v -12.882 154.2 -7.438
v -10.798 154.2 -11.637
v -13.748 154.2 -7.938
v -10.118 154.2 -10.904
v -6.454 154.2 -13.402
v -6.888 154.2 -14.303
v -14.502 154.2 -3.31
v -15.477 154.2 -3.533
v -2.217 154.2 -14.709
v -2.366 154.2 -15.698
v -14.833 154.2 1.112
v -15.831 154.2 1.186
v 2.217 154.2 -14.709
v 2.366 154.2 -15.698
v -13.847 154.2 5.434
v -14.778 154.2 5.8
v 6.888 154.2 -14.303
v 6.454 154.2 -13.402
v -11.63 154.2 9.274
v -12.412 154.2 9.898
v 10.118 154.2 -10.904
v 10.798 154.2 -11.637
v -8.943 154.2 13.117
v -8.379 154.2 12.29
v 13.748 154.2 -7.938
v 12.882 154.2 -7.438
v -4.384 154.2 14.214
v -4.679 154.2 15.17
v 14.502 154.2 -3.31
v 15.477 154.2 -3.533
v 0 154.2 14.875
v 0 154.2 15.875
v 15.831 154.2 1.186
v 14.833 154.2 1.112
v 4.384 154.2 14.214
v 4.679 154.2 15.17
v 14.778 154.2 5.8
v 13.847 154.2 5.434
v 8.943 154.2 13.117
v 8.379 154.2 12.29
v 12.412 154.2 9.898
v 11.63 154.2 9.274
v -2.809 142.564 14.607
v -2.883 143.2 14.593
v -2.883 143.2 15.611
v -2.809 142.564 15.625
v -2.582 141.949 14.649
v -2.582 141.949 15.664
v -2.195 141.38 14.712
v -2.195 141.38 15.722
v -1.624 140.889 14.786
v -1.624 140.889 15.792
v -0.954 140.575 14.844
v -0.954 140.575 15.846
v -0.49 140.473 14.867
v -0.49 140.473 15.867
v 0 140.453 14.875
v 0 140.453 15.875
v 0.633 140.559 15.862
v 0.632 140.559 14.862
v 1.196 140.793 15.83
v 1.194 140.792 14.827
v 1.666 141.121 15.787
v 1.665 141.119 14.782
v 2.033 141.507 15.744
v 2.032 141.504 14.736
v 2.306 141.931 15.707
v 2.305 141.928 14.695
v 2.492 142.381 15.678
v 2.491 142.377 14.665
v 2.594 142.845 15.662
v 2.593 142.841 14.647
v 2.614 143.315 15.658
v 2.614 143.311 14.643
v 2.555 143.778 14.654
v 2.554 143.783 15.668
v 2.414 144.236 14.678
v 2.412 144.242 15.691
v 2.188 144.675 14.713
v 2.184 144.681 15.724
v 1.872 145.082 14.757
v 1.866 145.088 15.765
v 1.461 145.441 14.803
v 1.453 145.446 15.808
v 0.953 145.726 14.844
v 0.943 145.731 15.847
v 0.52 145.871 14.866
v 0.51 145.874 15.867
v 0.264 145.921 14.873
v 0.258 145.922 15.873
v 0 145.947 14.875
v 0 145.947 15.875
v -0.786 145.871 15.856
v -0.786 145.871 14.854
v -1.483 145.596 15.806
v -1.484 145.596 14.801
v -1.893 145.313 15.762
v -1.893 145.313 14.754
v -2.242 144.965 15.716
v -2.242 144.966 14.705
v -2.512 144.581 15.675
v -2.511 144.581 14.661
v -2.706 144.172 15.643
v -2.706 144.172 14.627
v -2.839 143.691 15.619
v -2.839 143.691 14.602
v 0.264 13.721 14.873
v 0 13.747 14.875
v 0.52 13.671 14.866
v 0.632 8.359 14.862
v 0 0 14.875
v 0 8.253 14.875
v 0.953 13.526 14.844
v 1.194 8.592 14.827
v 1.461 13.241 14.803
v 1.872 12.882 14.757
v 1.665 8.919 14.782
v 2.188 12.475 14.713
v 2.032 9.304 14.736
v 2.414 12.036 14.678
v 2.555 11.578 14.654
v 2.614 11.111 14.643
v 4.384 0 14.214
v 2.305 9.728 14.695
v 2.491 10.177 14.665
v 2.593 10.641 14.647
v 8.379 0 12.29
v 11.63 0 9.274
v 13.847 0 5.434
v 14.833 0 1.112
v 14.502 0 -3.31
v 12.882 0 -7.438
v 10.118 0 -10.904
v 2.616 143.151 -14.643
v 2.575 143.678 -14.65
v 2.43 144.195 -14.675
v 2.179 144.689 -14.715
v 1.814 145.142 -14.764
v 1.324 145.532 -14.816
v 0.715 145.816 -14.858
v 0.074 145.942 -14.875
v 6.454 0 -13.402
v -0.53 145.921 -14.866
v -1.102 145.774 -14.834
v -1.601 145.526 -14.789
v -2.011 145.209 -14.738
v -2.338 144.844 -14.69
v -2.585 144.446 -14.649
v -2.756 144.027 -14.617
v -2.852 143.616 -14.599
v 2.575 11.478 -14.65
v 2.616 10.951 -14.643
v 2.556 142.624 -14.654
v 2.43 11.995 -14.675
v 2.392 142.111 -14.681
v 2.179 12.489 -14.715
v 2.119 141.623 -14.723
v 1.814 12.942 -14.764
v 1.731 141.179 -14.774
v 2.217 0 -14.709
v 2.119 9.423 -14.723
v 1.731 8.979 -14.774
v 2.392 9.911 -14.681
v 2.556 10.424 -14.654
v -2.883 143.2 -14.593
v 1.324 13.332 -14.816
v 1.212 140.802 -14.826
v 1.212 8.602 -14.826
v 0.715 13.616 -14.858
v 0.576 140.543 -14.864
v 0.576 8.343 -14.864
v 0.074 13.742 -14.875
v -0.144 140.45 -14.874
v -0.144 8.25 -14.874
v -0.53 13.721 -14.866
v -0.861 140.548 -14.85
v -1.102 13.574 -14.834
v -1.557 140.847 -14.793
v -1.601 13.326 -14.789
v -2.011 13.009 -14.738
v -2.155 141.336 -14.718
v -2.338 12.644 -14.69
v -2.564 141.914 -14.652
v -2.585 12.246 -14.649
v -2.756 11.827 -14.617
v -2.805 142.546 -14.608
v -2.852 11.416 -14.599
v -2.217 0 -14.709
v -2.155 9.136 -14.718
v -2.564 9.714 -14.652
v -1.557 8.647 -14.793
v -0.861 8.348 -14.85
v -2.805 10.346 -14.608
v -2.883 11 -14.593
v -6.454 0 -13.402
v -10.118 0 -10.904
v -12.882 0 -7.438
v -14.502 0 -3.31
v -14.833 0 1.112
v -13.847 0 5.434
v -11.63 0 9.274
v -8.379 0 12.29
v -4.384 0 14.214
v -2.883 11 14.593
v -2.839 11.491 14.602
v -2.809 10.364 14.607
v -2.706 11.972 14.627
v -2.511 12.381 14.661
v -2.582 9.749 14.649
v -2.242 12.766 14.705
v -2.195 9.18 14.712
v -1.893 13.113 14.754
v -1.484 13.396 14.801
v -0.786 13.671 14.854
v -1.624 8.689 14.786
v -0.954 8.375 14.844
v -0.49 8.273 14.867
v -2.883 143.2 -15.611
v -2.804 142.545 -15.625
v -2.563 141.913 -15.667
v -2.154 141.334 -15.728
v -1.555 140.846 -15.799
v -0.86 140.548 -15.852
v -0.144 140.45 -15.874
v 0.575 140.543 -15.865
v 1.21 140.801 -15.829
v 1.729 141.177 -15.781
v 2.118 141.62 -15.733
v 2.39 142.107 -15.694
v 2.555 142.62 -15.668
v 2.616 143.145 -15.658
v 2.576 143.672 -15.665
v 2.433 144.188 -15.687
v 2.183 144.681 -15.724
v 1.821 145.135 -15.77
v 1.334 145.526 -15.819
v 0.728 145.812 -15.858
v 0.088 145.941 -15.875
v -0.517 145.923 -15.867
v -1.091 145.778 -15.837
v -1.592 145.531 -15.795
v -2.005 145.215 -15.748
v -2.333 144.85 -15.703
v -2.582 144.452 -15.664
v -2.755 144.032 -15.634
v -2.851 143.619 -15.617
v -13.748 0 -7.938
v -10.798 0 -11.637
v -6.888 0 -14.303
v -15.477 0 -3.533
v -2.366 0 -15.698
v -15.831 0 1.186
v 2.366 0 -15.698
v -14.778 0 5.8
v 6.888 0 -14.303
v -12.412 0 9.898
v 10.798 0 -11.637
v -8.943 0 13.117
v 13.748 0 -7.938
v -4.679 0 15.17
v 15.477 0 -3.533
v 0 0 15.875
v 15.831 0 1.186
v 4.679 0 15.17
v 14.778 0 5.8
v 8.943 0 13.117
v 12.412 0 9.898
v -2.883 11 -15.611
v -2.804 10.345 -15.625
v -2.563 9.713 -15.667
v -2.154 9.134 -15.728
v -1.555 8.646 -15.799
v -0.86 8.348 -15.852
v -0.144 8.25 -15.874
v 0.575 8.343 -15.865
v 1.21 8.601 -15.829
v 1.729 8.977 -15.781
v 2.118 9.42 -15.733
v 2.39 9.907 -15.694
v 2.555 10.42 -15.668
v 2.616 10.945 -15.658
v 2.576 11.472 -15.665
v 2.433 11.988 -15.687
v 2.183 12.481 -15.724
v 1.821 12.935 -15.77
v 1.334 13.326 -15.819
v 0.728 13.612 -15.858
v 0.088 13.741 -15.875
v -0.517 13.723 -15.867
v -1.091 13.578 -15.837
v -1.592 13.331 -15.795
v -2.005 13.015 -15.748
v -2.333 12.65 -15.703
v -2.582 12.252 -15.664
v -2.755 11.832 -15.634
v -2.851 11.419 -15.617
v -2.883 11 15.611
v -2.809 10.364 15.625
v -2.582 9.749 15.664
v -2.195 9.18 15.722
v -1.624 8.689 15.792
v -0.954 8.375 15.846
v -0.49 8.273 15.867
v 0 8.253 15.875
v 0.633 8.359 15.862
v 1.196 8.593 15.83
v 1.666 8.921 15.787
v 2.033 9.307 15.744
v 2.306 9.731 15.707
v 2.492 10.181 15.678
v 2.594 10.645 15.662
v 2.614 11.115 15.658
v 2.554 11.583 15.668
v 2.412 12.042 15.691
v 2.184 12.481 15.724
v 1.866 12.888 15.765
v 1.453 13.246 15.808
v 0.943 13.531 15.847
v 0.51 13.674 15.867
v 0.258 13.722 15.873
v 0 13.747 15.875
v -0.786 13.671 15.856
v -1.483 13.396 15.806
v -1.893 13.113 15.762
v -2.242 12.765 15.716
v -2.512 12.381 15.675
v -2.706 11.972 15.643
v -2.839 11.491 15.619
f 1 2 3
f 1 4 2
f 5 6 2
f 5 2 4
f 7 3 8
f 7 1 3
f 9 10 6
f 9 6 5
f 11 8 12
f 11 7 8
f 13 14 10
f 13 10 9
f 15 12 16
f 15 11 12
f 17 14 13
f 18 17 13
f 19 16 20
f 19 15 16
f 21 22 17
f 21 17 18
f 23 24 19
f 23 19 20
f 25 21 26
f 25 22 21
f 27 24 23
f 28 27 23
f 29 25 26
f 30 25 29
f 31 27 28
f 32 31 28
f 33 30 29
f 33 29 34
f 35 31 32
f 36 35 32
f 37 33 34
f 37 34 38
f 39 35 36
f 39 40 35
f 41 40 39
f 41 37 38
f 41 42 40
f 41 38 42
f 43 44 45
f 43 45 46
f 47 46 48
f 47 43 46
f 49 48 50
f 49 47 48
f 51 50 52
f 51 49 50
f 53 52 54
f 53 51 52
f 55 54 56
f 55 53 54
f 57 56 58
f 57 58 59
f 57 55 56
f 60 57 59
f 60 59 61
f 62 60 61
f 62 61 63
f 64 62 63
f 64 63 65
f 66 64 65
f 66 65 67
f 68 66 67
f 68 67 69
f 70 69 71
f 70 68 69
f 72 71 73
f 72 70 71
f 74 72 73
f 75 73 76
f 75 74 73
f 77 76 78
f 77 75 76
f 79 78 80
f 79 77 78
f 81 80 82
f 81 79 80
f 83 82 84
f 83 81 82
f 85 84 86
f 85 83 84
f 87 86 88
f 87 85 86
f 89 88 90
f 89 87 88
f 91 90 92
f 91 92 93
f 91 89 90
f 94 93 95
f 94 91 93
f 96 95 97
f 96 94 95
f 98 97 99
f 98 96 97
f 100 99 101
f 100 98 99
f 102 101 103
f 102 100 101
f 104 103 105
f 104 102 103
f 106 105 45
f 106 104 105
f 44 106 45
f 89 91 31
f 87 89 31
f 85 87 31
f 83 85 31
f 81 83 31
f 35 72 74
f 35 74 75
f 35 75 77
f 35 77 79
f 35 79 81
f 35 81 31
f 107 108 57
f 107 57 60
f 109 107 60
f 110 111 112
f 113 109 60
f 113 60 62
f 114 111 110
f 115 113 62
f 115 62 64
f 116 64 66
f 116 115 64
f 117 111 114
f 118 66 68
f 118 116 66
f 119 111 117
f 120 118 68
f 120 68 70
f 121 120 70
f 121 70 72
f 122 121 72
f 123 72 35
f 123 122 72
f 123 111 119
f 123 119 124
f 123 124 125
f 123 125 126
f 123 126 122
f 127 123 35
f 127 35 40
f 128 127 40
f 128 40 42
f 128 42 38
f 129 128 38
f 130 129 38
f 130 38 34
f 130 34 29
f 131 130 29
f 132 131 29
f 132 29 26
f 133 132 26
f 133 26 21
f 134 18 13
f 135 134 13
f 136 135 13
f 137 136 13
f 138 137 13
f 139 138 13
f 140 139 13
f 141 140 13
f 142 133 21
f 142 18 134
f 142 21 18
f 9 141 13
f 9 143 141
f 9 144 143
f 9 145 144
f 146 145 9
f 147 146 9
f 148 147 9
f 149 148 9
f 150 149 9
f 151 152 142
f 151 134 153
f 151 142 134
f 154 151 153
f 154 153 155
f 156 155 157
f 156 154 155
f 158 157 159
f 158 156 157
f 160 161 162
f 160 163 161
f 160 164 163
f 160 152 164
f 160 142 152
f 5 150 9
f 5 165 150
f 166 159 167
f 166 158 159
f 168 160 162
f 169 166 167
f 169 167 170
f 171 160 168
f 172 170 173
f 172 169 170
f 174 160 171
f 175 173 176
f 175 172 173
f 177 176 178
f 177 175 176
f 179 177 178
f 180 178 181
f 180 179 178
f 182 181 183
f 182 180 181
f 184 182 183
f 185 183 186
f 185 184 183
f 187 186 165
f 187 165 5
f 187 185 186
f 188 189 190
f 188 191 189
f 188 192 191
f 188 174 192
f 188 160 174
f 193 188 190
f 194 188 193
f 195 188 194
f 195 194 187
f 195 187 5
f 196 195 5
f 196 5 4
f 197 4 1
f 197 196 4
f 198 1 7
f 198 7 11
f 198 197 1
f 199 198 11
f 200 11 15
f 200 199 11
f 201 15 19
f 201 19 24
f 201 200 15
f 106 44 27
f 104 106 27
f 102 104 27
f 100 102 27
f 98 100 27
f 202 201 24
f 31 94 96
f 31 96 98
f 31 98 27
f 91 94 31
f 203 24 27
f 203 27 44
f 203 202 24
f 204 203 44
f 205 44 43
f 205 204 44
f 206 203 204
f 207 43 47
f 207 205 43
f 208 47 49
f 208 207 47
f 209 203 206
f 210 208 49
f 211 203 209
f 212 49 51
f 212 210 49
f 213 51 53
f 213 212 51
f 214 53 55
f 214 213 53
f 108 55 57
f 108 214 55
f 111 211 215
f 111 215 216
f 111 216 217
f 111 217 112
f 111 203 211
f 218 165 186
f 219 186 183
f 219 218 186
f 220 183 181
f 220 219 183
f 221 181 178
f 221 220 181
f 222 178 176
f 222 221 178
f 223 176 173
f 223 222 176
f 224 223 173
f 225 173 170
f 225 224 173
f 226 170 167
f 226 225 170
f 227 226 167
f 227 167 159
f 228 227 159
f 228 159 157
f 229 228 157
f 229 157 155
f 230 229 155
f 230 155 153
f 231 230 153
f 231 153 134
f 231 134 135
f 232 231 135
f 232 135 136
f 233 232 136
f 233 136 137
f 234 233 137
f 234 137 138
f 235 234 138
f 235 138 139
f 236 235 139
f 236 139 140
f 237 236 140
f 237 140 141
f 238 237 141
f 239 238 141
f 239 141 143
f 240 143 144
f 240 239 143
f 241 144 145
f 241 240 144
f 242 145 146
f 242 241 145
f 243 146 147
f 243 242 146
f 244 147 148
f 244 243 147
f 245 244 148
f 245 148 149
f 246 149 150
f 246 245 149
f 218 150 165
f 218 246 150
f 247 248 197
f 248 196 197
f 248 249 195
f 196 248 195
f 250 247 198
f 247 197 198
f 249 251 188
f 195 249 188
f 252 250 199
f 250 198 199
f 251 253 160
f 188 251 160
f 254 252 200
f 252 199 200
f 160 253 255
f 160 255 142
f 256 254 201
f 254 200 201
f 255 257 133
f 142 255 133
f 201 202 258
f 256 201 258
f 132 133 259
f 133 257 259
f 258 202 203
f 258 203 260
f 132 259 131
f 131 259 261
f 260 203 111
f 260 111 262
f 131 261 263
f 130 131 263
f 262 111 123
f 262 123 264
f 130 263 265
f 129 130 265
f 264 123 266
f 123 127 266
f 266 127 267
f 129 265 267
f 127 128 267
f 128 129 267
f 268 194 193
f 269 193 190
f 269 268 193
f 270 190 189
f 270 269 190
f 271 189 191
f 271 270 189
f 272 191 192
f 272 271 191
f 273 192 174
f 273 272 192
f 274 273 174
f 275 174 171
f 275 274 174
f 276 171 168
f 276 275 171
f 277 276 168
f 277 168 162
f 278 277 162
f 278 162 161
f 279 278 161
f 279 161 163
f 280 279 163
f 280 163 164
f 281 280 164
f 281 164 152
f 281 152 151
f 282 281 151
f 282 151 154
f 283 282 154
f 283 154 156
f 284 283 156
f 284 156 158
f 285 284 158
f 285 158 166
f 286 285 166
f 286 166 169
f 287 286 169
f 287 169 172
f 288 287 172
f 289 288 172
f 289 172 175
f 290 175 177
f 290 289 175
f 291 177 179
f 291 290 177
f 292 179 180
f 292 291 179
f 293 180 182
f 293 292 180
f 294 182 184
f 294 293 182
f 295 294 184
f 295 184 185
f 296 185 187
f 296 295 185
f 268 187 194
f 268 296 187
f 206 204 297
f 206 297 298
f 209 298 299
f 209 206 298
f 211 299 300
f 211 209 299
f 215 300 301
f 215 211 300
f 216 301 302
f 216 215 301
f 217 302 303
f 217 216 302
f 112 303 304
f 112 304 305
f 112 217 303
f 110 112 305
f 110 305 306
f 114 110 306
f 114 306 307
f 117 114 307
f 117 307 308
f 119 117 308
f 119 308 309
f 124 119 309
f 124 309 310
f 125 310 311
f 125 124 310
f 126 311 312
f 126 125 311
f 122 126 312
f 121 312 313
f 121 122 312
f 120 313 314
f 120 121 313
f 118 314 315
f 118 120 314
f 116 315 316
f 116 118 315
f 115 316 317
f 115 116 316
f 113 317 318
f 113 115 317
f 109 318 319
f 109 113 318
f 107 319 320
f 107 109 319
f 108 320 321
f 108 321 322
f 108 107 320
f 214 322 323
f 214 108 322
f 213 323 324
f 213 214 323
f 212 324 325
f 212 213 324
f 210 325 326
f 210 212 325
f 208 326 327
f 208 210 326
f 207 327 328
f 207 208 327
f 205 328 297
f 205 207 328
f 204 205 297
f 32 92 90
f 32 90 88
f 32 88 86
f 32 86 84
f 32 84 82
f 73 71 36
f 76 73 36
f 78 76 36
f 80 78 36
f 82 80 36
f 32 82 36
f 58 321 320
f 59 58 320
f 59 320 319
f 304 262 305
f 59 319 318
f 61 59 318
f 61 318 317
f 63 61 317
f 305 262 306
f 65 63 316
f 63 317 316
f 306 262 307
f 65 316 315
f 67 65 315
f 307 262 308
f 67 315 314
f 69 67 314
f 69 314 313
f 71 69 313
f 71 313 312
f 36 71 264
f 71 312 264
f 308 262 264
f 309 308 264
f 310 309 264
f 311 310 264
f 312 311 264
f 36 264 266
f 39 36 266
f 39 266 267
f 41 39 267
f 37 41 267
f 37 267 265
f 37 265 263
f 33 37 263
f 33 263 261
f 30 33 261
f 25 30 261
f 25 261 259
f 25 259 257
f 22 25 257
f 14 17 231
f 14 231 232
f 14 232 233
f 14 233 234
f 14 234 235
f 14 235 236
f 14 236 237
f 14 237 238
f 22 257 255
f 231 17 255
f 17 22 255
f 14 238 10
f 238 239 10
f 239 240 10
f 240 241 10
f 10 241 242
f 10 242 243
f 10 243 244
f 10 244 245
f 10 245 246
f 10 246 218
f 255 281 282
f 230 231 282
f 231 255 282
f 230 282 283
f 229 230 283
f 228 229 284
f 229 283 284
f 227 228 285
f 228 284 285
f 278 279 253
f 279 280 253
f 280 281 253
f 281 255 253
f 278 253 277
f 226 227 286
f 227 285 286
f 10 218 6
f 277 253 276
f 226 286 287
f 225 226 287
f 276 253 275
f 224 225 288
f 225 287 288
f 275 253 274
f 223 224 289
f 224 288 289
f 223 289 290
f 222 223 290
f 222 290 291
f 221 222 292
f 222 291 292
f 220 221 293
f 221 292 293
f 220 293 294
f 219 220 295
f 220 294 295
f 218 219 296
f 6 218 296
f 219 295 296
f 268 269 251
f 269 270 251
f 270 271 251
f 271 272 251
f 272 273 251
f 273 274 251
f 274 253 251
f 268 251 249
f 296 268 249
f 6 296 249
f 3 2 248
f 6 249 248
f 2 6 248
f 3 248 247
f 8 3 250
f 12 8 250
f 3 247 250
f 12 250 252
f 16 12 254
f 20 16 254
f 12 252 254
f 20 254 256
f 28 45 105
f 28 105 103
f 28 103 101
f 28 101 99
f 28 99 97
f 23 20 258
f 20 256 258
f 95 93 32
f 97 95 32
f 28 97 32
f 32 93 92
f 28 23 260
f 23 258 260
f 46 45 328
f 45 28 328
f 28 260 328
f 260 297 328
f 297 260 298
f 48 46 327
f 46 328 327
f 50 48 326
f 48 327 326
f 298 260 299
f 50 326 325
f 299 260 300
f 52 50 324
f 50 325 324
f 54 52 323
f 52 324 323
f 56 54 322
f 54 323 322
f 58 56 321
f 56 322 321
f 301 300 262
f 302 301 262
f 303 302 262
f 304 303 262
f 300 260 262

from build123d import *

# Parameters (mm, degrees)
SKETCH1_R               = 15.875
SKETCH1_R_2             = 14.875
BOSS_EXTRUDE1_DEPTH     = 154.2
CUT_EXTRUDE1_DEPTH      = 154.2
CUT_EXTRUDE1_DEPTH_BACK = 154.2
SKETCH2_R               = 2.75


with BuildPart() as part:
    # Sketch1 → Boss-Extrude1 (new body)
    with BuildSketch(Plane(origin=(0, 0, 0), x_dir=(1, 0, 0), z_dir=(0, 1, 0))):
        Circle(SKETCH1_R)
        Circle(SKETCH1_R_2, mode=Mode.SUBTRACT)
    extrude(amount=BOSS_EXTRUDE1_DEPTH)

    # Sketch2 → Cut-Extrude1 (cut, two sides: drawn at the far end of the back side and taken through both)
    with BuildSketch(Plane.XY.offset(-CUT_EXTRUDE1_DEPTH_BACK)):
        with Locations((-0.133461596, 143.2)):
            Circle(SKETCH2_R)
        with Locations((-0.133461596, 11)):
            Circle(SKETCH2_R)
    extrude(amount=CUT_EXTRUDE1_DEPTH + CUT_EXTRUDE1_DEPTH_BACK, mode=Mode.SUBTRACT)


solid = part.part
